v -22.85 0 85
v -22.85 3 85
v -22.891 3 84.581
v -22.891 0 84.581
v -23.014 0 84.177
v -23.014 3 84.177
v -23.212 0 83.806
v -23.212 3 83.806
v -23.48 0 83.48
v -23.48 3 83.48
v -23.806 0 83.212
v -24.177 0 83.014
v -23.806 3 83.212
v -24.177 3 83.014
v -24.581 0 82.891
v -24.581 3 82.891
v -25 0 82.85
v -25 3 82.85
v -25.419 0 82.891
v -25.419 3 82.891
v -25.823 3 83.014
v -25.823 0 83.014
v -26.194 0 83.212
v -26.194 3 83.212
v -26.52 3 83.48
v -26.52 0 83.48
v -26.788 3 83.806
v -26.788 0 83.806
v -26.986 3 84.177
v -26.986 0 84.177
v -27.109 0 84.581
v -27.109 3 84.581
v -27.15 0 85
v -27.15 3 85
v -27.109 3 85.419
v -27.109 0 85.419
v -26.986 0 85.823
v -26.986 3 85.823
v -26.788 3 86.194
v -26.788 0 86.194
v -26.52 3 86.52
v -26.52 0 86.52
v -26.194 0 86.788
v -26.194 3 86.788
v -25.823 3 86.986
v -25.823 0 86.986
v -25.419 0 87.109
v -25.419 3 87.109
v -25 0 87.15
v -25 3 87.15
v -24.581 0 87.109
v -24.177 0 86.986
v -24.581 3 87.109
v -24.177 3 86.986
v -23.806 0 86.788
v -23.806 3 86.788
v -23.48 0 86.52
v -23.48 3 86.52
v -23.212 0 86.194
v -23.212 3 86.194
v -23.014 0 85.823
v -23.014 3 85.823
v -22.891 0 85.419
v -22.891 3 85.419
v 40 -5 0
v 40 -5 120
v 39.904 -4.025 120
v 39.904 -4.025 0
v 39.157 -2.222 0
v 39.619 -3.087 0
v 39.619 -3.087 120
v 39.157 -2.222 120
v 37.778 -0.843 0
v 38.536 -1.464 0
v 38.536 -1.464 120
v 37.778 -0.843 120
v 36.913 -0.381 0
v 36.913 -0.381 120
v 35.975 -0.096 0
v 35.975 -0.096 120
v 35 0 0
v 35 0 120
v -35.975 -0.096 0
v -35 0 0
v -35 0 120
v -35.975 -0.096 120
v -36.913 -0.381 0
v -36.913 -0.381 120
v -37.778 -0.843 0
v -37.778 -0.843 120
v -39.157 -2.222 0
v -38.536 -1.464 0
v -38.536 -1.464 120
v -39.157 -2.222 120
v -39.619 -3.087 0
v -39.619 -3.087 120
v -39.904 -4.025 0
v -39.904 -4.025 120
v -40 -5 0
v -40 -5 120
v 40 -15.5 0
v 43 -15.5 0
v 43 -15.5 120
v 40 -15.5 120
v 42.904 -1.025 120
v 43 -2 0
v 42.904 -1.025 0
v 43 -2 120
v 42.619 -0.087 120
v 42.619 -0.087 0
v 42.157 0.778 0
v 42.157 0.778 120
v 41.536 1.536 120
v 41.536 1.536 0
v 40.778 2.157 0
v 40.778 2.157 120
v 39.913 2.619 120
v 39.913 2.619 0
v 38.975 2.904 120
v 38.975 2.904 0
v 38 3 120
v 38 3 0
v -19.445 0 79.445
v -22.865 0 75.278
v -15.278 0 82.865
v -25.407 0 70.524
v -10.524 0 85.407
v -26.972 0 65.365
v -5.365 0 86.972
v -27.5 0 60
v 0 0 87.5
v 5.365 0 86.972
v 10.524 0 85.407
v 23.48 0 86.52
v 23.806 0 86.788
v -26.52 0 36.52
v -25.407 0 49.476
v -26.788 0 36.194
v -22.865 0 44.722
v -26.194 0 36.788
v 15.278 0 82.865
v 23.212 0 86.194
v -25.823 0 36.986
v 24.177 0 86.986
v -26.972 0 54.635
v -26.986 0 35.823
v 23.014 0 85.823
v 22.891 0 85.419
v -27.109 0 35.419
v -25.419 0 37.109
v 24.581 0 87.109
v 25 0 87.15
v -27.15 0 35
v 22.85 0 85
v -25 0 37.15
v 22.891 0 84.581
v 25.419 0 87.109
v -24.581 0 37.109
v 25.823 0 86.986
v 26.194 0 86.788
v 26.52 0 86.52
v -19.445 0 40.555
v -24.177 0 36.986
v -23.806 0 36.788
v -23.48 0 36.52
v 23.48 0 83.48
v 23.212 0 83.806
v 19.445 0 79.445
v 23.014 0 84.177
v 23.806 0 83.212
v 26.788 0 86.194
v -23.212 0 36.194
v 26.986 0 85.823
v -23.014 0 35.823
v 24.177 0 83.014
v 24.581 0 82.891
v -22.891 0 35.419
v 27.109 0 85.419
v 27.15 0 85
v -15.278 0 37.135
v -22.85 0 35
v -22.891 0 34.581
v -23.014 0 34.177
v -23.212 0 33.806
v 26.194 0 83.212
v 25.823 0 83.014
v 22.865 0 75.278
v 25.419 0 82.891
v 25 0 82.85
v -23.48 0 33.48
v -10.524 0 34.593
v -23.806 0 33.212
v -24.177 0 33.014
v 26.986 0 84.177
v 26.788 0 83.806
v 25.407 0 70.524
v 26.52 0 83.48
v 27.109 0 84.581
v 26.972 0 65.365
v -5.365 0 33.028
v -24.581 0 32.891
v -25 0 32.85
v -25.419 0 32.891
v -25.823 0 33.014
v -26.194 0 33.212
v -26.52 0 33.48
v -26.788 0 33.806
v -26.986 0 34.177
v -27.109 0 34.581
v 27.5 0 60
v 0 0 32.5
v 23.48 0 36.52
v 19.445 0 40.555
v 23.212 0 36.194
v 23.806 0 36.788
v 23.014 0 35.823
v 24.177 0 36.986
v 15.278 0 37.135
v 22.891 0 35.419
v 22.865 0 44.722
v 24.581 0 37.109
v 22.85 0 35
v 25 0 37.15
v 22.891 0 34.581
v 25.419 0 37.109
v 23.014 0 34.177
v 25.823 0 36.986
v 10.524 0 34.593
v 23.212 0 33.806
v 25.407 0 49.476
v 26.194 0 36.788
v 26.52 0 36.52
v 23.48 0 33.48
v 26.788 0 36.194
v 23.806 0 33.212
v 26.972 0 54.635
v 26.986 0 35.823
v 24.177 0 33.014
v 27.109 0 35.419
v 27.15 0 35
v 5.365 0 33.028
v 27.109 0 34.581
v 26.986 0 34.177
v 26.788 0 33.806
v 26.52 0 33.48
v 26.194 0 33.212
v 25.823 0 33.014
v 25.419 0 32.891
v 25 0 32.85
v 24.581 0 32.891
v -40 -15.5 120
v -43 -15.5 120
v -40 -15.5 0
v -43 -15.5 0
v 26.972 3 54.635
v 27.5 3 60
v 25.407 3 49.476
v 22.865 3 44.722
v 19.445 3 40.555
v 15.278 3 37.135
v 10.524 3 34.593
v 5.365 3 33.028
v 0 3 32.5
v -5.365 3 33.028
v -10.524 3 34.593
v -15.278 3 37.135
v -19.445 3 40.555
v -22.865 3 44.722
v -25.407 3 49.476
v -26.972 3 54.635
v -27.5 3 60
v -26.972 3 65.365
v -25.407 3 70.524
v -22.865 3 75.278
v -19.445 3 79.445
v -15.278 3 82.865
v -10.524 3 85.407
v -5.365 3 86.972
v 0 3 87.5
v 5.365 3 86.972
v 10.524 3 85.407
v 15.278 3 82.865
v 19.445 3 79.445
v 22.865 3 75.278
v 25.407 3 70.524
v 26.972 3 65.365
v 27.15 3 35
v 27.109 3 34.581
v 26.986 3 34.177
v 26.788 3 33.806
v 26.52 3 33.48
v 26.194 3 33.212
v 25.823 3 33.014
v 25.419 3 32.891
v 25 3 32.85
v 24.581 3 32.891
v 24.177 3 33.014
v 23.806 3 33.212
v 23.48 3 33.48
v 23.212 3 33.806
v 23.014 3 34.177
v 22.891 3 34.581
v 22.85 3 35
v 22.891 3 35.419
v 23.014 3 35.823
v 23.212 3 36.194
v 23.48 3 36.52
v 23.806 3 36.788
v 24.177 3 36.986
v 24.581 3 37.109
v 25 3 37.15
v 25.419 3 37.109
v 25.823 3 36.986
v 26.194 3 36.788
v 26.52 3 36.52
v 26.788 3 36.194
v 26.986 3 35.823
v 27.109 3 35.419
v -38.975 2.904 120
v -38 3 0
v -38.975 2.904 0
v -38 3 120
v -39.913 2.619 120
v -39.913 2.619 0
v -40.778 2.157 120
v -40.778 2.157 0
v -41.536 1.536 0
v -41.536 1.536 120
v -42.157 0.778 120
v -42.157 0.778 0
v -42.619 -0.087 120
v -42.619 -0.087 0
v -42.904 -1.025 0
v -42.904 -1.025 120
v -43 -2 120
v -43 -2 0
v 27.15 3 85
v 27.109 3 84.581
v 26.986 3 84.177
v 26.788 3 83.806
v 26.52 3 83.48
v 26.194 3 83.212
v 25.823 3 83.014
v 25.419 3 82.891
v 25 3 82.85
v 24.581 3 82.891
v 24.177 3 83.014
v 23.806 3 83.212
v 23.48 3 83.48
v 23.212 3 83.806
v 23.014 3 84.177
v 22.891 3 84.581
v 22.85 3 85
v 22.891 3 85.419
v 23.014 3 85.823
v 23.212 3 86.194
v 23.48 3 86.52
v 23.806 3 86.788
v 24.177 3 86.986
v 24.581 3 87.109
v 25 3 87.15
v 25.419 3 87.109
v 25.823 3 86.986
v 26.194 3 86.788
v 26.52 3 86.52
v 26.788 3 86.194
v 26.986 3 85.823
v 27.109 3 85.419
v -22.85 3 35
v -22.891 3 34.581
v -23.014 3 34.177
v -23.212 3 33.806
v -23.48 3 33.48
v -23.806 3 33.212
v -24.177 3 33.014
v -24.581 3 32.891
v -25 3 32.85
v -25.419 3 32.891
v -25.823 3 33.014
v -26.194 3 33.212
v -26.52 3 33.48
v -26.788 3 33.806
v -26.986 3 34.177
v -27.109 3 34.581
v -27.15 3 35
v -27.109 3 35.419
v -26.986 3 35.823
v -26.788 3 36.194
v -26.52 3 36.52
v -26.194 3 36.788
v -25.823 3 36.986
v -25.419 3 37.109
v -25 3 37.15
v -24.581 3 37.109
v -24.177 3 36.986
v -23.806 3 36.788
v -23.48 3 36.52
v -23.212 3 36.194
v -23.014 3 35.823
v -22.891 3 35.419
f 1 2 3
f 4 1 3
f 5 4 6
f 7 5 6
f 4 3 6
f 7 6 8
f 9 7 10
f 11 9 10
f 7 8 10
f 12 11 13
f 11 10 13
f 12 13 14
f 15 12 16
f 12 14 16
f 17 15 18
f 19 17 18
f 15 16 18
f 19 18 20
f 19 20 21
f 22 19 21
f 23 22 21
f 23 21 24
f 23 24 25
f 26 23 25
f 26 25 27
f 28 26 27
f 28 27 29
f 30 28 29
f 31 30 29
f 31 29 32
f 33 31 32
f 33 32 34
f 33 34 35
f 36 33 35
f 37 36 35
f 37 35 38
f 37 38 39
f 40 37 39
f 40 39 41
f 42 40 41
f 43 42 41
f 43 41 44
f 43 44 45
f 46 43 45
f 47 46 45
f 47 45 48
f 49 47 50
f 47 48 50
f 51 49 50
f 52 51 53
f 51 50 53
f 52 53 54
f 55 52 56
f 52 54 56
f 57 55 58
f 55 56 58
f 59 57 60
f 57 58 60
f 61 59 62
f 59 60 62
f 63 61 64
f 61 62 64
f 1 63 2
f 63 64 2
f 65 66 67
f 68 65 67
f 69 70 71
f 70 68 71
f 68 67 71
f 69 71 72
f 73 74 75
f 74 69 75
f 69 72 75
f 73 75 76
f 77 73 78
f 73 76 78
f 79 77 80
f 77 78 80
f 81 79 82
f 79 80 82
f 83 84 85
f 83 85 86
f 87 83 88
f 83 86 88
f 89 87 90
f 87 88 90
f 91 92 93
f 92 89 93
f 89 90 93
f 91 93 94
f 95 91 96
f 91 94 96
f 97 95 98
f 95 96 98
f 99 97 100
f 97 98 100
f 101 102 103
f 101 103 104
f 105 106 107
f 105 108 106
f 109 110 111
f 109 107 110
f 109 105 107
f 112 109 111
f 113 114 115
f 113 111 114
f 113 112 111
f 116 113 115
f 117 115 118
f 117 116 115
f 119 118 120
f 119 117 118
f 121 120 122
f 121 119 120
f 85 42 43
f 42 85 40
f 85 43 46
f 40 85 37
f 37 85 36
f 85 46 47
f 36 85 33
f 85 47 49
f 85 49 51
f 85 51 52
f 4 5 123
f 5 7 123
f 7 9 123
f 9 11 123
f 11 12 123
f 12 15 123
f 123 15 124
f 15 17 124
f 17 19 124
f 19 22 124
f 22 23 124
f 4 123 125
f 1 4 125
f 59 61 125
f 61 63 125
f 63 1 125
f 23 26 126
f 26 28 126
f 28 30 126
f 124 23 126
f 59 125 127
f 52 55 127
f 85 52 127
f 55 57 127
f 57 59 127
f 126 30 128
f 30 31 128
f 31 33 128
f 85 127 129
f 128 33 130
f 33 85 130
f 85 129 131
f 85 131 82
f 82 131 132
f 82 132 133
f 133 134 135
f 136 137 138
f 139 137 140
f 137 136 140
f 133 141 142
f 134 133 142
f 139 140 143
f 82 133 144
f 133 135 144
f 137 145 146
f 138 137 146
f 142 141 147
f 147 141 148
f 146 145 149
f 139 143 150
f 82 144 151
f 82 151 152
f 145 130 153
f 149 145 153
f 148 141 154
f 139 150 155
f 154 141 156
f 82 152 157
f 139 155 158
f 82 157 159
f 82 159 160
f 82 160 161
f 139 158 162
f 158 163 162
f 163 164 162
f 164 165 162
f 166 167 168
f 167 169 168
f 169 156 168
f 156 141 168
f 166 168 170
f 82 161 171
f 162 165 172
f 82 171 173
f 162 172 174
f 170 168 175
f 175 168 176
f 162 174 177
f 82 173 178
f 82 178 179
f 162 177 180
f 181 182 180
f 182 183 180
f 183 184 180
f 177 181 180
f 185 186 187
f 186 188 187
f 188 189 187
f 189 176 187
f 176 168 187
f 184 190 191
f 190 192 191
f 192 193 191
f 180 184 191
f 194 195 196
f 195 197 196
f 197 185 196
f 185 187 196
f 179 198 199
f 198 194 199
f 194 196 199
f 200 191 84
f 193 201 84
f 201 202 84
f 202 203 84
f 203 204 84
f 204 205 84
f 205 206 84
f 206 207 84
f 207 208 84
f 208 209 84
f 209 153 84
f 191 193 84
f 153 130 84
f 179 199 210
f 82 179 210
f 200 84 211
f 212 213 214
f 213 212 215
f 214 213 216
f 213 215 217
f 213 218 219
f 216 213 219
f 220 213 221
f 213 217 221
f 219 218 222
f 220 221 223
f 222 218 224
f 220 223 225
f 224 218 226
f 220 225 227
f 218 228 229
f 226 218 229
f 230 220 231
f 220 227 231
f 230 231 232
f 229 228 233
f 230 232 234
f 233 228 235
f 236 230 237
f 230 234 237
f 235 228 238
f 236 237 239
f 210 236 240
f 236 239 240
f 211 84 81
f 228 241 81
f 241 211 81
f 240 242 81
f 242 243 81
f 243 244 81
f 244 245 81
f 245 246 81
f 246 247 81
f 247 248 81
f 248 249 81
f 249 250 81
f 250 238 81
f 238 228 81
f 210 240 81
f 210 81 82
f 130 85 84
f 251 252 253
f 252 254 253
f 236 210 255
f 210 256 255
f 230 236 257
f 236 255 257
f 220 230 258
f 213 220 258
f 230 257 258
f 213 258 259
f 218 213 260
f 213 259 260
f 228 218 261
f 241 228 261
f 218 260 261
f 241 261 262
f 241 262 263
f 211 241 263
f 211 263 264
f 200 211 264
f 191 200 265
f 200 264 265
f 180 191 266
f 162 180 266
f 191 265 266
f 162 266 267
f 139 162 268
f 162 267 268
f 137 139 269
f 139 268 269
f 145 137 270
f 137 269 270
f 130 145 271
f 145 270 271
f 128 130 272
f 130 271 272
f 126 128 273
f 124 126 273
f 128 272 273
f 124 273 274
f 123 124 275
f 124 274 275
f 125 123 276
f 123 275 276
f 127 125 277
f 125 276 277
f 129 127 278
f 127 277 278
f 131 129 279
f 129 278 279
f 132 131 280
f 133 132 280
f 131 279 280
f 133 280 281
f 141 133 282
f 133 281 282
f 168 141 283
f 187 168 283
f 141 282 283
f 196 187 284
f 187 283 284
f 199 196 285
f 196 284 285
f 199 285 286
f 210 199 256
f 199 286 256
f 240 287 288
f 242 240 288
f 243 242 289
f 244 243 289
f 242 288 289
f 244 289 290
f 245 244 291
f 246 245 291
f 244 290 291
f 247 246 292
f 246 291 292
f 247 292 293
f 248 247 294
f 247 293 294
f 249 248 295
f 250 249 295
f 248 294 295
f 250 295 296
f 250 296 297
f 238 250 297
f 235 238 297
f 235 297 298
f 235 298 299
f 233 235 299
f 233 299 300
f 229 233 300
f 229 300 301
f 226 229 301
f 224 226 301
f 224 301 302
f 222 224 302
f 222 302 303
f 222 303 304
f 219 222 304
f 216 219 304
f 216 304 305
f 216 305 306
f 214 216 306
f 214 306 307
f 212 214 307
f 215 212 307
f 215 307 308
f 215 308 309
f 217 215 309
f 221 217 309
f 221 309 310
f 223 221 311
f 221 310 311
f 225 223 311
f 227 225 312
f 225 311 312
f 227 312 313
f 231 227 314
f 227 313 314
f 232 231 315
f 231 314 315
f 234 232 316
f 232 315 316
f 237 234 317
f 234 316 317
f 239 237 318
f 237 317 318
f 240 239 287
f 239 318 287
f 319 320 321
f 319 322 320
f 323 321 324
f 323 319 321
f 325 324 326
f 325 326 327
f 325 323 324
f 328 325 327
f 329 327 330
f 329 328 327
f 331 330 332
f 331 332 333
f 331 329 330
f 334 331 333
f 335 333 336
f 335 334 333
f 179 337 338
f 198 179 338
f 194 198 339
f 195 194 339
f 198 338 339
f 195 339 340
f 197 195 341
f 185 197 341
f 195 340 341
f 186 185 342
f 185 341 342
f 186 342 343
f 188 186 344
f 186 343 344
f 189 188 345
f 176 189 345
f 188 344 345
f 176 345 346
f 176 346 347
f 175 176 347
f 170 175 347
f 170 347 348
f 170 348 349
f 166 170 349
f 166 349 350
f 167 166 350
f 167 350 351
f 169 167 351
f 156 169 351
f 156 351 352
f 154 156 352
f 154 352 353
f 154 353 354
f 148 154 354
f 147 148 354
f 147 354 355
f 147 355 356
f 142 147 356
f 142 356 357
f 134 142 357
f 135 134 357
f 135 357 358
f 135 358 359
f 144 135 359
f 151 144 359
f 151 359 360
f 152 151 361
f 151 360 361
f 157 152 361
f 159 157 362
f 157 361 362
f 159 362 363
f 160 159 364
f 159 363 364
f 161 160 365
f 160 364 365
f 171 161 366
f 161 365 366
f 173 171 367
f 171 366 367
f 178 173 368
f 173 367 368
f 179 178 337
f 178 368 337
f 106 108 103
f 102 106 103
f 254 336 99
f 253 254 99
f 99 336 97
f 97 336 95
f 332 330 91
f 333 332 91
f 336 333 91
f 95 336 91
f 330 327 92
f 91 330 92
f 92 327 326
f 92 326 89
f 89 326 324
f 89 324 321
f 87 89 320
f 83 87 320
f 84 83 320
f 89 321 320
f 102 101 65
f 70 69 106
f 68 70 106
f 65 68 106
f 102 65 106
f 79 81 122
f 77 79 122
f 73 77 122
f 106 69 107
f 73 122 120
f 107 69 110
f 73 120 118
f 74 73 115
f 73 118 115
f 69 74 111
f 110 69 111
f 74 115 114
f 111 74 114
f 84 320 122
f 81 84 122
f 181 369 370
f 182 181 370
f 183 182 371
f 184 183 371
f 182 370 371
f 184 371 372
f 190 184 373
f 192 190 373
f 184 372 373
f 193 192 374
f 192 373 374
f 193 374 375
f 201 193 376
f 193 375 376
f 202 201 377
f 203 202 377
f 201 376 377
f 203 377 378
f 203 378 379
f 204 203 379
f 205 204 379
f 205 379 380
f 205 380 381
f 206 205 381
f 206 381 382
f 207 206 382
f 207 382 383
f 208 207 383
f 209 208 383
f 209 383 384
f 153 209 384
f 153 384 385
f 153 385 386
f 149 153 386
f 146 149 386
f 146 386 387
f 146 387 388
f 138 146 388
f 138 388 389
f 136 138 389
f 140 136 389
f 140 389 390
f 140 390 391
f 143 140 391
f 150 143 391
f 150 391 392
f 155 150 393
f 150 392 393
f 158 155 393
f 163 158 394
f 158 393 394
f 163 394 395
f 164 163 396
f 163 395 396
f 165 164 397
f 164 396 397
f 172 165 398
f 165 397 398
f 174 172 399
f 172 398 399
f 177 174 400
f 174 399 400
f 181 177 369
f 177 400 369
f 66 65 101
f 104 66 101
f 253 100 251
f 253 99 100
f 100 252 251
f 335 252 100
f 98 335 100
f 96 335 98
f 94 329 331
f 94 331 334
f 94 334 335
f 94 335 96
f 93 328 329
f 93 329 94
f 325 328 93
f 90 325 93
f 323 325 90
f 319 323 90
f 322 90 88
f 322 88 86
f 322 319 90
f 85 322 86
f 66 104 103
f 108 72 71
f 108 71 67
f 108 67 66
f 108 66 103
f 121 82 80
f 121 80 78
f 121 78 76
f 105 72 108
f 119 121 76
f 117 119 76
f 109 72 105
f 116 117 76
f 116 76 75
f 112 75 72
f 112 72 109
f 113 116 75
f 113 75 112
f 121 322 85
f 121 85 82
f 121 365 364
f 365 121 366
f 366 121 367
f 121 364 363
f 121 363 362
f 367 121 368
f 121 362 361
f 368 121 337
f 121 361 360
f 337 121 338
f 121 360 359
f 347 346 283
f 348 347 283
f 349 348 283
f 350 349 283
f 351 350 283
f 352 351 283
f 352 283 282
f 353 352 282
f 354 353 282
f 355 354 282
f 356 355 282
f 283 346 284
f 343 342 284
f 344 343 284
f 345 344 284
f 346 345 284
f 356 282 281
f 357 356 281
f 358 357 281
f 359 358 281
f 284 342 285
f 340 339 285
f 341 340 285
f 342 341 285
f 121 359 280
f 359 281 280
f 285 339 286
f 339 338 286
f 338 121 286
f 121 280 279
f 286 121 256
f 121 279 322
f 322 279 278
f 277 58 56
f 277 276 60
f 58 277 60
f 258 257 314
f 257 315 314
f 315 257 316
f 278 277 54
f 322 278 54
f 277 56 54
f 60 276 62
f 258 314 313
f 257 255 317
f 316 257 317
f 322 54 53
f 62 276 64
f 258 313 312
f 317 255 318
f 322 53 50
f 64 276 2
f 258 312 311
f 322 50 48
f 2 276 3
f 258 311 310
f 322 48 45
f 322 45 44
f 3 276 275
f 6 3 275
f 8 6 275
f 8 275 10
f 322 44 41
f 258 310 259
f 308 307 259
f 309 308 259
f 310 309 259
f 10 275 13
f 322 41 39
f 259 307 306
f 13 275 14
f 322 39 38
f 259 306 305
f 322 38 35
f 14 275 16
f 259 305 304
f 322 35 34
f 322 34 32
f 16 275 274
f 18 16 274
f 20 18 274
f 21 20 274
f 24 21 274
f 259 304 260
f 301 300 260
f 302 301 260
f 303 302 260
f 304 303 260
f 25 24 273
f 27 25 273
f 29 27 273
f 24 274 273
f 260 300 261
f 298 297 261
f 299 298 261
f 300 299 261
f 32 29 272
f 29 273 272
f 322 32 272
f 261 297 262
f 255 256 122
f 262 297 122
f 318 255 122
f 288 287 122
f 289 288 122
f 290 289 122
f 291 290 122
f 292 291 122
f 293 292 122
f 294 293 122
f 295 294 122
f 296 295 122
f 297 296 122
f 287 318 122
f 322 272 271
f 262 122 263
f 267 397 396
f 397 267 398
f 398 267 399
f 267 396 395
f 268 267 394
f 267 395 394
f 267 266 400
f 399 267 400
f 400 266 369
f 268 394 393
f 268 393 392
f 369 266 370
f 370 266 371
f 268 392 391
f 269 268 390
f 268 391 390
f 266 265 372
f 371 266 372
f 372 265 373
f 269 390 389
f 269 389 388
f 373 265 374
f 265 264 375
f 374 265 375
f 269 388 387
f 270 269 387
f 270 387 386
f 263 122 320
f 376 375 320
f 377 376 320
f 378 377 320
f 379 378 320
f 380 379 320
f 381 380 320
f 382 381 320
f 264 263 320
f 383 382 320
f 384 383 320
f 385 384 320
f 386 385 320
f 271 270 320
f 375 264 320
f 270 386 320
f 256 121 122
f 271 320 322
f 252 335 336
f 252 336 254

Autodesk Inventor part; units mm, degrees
ref_plane "YZ Plane" through (0, 0, 0) normal (1, 0, 0) x (0, 1, 0)
ref_plane "XZ Plane" through (0, 0, 0) normal (0, 1, 0) x (-1, 0, 0)
ref_plane "XY Plane" through (0, 0, 0) normal (0, 0, 1) x (1, 0, 0)
sketch "Sketch1" plane through (0, 0, 0) normal (0, 0, 1) x (1, 0, 0)
  line L0 (0, 0) -> (40, 0)
  line L1 (0, 0) -> (0, -20) construction
  line L2 (40, 0) -> (40, -15.5)
  line L3 (0, 0) -> (40, 0)
  line L4 (40, 0) -> (40, 3)
  line L5 (40, 3) -> (0, 3)
  line L6 (0, 3) -> (0, 0)
  line L7 (40, 3) -> (43, 3)
  line L8 (43, 3) -> (43, -15.5)
  line L9 (43, -15.5) -> (40, -15.5)
  line L10 (40, -15.5) -> (40, 3)
  line L11 (0, 0) -> (-40, 0)
  line L12 (-40, 0) -> (-40, -15.5)
  line L13 (-40, 3) -> (0, 3)
  line L14 (-40, 3) -> (-43, 3)
  line L15 (-43, 3) -> (-43, -15.5)
  line L16 (-43, -15.5) -> (-40, -15.5)
  point P0 (41.5, -15.5)
  dimension "d0" = 40
  dimension "d1" = 20
  dimension "d3" = 3
  dimension "d4" = 3
  dimension "d17" = 15.5
extrude "Extrusion1" add sketch "Sketch1" along normal blind 120
sketch "Sketch2" plane through (-43, 3, 0) normal (0, 1, 0) x (1, 0, 0)
  line L0 (86, 0) -> (86, -120) projected
  line L1 (86, -60) -> (0, -60) construction
  line L2 (0, 0) -> (0, -120) projected
  line L3 (68, -35) -> (18, -35) construction
  line L4 (18, -35) -> (18, -85) construction
  line L5 (18, -85) -> (68, -85) construction
  line L6 (68, -85) -> (68, -35) construction
  line L7 (68, -35) -> (18, -85) construction
  line L8 (18, -35) -> (68, -85) construction
  circle A0 centre (68, -85) radius 2.15
  circle A1 centre (18, -85) radius 2.15
  circle A2 centre (68, -35) radius 2.15
  circle A3 centre (18, -35) radius 2.15
  circle A4 centre (43, -60) radius 27.5
  point P0 (43, 0)
  dimension "d7" = 50
  dimension "d8" = 50
  dimension "d9" = 4.3
  dimension "d10" = 4.3
  dimension "d11" = 4.3
  dimension "d12" = 4.3
  dimension "d15" = 55
extrude "Extrusion2" cut sketch "Sketch2" against normal through all
fillet "Fillet1" radius 5 4 edges at (40, 0, 60) (43, 3, 60) (-40, 0, 60) (-43, 3, 60)
properties part number "FanHolder"
